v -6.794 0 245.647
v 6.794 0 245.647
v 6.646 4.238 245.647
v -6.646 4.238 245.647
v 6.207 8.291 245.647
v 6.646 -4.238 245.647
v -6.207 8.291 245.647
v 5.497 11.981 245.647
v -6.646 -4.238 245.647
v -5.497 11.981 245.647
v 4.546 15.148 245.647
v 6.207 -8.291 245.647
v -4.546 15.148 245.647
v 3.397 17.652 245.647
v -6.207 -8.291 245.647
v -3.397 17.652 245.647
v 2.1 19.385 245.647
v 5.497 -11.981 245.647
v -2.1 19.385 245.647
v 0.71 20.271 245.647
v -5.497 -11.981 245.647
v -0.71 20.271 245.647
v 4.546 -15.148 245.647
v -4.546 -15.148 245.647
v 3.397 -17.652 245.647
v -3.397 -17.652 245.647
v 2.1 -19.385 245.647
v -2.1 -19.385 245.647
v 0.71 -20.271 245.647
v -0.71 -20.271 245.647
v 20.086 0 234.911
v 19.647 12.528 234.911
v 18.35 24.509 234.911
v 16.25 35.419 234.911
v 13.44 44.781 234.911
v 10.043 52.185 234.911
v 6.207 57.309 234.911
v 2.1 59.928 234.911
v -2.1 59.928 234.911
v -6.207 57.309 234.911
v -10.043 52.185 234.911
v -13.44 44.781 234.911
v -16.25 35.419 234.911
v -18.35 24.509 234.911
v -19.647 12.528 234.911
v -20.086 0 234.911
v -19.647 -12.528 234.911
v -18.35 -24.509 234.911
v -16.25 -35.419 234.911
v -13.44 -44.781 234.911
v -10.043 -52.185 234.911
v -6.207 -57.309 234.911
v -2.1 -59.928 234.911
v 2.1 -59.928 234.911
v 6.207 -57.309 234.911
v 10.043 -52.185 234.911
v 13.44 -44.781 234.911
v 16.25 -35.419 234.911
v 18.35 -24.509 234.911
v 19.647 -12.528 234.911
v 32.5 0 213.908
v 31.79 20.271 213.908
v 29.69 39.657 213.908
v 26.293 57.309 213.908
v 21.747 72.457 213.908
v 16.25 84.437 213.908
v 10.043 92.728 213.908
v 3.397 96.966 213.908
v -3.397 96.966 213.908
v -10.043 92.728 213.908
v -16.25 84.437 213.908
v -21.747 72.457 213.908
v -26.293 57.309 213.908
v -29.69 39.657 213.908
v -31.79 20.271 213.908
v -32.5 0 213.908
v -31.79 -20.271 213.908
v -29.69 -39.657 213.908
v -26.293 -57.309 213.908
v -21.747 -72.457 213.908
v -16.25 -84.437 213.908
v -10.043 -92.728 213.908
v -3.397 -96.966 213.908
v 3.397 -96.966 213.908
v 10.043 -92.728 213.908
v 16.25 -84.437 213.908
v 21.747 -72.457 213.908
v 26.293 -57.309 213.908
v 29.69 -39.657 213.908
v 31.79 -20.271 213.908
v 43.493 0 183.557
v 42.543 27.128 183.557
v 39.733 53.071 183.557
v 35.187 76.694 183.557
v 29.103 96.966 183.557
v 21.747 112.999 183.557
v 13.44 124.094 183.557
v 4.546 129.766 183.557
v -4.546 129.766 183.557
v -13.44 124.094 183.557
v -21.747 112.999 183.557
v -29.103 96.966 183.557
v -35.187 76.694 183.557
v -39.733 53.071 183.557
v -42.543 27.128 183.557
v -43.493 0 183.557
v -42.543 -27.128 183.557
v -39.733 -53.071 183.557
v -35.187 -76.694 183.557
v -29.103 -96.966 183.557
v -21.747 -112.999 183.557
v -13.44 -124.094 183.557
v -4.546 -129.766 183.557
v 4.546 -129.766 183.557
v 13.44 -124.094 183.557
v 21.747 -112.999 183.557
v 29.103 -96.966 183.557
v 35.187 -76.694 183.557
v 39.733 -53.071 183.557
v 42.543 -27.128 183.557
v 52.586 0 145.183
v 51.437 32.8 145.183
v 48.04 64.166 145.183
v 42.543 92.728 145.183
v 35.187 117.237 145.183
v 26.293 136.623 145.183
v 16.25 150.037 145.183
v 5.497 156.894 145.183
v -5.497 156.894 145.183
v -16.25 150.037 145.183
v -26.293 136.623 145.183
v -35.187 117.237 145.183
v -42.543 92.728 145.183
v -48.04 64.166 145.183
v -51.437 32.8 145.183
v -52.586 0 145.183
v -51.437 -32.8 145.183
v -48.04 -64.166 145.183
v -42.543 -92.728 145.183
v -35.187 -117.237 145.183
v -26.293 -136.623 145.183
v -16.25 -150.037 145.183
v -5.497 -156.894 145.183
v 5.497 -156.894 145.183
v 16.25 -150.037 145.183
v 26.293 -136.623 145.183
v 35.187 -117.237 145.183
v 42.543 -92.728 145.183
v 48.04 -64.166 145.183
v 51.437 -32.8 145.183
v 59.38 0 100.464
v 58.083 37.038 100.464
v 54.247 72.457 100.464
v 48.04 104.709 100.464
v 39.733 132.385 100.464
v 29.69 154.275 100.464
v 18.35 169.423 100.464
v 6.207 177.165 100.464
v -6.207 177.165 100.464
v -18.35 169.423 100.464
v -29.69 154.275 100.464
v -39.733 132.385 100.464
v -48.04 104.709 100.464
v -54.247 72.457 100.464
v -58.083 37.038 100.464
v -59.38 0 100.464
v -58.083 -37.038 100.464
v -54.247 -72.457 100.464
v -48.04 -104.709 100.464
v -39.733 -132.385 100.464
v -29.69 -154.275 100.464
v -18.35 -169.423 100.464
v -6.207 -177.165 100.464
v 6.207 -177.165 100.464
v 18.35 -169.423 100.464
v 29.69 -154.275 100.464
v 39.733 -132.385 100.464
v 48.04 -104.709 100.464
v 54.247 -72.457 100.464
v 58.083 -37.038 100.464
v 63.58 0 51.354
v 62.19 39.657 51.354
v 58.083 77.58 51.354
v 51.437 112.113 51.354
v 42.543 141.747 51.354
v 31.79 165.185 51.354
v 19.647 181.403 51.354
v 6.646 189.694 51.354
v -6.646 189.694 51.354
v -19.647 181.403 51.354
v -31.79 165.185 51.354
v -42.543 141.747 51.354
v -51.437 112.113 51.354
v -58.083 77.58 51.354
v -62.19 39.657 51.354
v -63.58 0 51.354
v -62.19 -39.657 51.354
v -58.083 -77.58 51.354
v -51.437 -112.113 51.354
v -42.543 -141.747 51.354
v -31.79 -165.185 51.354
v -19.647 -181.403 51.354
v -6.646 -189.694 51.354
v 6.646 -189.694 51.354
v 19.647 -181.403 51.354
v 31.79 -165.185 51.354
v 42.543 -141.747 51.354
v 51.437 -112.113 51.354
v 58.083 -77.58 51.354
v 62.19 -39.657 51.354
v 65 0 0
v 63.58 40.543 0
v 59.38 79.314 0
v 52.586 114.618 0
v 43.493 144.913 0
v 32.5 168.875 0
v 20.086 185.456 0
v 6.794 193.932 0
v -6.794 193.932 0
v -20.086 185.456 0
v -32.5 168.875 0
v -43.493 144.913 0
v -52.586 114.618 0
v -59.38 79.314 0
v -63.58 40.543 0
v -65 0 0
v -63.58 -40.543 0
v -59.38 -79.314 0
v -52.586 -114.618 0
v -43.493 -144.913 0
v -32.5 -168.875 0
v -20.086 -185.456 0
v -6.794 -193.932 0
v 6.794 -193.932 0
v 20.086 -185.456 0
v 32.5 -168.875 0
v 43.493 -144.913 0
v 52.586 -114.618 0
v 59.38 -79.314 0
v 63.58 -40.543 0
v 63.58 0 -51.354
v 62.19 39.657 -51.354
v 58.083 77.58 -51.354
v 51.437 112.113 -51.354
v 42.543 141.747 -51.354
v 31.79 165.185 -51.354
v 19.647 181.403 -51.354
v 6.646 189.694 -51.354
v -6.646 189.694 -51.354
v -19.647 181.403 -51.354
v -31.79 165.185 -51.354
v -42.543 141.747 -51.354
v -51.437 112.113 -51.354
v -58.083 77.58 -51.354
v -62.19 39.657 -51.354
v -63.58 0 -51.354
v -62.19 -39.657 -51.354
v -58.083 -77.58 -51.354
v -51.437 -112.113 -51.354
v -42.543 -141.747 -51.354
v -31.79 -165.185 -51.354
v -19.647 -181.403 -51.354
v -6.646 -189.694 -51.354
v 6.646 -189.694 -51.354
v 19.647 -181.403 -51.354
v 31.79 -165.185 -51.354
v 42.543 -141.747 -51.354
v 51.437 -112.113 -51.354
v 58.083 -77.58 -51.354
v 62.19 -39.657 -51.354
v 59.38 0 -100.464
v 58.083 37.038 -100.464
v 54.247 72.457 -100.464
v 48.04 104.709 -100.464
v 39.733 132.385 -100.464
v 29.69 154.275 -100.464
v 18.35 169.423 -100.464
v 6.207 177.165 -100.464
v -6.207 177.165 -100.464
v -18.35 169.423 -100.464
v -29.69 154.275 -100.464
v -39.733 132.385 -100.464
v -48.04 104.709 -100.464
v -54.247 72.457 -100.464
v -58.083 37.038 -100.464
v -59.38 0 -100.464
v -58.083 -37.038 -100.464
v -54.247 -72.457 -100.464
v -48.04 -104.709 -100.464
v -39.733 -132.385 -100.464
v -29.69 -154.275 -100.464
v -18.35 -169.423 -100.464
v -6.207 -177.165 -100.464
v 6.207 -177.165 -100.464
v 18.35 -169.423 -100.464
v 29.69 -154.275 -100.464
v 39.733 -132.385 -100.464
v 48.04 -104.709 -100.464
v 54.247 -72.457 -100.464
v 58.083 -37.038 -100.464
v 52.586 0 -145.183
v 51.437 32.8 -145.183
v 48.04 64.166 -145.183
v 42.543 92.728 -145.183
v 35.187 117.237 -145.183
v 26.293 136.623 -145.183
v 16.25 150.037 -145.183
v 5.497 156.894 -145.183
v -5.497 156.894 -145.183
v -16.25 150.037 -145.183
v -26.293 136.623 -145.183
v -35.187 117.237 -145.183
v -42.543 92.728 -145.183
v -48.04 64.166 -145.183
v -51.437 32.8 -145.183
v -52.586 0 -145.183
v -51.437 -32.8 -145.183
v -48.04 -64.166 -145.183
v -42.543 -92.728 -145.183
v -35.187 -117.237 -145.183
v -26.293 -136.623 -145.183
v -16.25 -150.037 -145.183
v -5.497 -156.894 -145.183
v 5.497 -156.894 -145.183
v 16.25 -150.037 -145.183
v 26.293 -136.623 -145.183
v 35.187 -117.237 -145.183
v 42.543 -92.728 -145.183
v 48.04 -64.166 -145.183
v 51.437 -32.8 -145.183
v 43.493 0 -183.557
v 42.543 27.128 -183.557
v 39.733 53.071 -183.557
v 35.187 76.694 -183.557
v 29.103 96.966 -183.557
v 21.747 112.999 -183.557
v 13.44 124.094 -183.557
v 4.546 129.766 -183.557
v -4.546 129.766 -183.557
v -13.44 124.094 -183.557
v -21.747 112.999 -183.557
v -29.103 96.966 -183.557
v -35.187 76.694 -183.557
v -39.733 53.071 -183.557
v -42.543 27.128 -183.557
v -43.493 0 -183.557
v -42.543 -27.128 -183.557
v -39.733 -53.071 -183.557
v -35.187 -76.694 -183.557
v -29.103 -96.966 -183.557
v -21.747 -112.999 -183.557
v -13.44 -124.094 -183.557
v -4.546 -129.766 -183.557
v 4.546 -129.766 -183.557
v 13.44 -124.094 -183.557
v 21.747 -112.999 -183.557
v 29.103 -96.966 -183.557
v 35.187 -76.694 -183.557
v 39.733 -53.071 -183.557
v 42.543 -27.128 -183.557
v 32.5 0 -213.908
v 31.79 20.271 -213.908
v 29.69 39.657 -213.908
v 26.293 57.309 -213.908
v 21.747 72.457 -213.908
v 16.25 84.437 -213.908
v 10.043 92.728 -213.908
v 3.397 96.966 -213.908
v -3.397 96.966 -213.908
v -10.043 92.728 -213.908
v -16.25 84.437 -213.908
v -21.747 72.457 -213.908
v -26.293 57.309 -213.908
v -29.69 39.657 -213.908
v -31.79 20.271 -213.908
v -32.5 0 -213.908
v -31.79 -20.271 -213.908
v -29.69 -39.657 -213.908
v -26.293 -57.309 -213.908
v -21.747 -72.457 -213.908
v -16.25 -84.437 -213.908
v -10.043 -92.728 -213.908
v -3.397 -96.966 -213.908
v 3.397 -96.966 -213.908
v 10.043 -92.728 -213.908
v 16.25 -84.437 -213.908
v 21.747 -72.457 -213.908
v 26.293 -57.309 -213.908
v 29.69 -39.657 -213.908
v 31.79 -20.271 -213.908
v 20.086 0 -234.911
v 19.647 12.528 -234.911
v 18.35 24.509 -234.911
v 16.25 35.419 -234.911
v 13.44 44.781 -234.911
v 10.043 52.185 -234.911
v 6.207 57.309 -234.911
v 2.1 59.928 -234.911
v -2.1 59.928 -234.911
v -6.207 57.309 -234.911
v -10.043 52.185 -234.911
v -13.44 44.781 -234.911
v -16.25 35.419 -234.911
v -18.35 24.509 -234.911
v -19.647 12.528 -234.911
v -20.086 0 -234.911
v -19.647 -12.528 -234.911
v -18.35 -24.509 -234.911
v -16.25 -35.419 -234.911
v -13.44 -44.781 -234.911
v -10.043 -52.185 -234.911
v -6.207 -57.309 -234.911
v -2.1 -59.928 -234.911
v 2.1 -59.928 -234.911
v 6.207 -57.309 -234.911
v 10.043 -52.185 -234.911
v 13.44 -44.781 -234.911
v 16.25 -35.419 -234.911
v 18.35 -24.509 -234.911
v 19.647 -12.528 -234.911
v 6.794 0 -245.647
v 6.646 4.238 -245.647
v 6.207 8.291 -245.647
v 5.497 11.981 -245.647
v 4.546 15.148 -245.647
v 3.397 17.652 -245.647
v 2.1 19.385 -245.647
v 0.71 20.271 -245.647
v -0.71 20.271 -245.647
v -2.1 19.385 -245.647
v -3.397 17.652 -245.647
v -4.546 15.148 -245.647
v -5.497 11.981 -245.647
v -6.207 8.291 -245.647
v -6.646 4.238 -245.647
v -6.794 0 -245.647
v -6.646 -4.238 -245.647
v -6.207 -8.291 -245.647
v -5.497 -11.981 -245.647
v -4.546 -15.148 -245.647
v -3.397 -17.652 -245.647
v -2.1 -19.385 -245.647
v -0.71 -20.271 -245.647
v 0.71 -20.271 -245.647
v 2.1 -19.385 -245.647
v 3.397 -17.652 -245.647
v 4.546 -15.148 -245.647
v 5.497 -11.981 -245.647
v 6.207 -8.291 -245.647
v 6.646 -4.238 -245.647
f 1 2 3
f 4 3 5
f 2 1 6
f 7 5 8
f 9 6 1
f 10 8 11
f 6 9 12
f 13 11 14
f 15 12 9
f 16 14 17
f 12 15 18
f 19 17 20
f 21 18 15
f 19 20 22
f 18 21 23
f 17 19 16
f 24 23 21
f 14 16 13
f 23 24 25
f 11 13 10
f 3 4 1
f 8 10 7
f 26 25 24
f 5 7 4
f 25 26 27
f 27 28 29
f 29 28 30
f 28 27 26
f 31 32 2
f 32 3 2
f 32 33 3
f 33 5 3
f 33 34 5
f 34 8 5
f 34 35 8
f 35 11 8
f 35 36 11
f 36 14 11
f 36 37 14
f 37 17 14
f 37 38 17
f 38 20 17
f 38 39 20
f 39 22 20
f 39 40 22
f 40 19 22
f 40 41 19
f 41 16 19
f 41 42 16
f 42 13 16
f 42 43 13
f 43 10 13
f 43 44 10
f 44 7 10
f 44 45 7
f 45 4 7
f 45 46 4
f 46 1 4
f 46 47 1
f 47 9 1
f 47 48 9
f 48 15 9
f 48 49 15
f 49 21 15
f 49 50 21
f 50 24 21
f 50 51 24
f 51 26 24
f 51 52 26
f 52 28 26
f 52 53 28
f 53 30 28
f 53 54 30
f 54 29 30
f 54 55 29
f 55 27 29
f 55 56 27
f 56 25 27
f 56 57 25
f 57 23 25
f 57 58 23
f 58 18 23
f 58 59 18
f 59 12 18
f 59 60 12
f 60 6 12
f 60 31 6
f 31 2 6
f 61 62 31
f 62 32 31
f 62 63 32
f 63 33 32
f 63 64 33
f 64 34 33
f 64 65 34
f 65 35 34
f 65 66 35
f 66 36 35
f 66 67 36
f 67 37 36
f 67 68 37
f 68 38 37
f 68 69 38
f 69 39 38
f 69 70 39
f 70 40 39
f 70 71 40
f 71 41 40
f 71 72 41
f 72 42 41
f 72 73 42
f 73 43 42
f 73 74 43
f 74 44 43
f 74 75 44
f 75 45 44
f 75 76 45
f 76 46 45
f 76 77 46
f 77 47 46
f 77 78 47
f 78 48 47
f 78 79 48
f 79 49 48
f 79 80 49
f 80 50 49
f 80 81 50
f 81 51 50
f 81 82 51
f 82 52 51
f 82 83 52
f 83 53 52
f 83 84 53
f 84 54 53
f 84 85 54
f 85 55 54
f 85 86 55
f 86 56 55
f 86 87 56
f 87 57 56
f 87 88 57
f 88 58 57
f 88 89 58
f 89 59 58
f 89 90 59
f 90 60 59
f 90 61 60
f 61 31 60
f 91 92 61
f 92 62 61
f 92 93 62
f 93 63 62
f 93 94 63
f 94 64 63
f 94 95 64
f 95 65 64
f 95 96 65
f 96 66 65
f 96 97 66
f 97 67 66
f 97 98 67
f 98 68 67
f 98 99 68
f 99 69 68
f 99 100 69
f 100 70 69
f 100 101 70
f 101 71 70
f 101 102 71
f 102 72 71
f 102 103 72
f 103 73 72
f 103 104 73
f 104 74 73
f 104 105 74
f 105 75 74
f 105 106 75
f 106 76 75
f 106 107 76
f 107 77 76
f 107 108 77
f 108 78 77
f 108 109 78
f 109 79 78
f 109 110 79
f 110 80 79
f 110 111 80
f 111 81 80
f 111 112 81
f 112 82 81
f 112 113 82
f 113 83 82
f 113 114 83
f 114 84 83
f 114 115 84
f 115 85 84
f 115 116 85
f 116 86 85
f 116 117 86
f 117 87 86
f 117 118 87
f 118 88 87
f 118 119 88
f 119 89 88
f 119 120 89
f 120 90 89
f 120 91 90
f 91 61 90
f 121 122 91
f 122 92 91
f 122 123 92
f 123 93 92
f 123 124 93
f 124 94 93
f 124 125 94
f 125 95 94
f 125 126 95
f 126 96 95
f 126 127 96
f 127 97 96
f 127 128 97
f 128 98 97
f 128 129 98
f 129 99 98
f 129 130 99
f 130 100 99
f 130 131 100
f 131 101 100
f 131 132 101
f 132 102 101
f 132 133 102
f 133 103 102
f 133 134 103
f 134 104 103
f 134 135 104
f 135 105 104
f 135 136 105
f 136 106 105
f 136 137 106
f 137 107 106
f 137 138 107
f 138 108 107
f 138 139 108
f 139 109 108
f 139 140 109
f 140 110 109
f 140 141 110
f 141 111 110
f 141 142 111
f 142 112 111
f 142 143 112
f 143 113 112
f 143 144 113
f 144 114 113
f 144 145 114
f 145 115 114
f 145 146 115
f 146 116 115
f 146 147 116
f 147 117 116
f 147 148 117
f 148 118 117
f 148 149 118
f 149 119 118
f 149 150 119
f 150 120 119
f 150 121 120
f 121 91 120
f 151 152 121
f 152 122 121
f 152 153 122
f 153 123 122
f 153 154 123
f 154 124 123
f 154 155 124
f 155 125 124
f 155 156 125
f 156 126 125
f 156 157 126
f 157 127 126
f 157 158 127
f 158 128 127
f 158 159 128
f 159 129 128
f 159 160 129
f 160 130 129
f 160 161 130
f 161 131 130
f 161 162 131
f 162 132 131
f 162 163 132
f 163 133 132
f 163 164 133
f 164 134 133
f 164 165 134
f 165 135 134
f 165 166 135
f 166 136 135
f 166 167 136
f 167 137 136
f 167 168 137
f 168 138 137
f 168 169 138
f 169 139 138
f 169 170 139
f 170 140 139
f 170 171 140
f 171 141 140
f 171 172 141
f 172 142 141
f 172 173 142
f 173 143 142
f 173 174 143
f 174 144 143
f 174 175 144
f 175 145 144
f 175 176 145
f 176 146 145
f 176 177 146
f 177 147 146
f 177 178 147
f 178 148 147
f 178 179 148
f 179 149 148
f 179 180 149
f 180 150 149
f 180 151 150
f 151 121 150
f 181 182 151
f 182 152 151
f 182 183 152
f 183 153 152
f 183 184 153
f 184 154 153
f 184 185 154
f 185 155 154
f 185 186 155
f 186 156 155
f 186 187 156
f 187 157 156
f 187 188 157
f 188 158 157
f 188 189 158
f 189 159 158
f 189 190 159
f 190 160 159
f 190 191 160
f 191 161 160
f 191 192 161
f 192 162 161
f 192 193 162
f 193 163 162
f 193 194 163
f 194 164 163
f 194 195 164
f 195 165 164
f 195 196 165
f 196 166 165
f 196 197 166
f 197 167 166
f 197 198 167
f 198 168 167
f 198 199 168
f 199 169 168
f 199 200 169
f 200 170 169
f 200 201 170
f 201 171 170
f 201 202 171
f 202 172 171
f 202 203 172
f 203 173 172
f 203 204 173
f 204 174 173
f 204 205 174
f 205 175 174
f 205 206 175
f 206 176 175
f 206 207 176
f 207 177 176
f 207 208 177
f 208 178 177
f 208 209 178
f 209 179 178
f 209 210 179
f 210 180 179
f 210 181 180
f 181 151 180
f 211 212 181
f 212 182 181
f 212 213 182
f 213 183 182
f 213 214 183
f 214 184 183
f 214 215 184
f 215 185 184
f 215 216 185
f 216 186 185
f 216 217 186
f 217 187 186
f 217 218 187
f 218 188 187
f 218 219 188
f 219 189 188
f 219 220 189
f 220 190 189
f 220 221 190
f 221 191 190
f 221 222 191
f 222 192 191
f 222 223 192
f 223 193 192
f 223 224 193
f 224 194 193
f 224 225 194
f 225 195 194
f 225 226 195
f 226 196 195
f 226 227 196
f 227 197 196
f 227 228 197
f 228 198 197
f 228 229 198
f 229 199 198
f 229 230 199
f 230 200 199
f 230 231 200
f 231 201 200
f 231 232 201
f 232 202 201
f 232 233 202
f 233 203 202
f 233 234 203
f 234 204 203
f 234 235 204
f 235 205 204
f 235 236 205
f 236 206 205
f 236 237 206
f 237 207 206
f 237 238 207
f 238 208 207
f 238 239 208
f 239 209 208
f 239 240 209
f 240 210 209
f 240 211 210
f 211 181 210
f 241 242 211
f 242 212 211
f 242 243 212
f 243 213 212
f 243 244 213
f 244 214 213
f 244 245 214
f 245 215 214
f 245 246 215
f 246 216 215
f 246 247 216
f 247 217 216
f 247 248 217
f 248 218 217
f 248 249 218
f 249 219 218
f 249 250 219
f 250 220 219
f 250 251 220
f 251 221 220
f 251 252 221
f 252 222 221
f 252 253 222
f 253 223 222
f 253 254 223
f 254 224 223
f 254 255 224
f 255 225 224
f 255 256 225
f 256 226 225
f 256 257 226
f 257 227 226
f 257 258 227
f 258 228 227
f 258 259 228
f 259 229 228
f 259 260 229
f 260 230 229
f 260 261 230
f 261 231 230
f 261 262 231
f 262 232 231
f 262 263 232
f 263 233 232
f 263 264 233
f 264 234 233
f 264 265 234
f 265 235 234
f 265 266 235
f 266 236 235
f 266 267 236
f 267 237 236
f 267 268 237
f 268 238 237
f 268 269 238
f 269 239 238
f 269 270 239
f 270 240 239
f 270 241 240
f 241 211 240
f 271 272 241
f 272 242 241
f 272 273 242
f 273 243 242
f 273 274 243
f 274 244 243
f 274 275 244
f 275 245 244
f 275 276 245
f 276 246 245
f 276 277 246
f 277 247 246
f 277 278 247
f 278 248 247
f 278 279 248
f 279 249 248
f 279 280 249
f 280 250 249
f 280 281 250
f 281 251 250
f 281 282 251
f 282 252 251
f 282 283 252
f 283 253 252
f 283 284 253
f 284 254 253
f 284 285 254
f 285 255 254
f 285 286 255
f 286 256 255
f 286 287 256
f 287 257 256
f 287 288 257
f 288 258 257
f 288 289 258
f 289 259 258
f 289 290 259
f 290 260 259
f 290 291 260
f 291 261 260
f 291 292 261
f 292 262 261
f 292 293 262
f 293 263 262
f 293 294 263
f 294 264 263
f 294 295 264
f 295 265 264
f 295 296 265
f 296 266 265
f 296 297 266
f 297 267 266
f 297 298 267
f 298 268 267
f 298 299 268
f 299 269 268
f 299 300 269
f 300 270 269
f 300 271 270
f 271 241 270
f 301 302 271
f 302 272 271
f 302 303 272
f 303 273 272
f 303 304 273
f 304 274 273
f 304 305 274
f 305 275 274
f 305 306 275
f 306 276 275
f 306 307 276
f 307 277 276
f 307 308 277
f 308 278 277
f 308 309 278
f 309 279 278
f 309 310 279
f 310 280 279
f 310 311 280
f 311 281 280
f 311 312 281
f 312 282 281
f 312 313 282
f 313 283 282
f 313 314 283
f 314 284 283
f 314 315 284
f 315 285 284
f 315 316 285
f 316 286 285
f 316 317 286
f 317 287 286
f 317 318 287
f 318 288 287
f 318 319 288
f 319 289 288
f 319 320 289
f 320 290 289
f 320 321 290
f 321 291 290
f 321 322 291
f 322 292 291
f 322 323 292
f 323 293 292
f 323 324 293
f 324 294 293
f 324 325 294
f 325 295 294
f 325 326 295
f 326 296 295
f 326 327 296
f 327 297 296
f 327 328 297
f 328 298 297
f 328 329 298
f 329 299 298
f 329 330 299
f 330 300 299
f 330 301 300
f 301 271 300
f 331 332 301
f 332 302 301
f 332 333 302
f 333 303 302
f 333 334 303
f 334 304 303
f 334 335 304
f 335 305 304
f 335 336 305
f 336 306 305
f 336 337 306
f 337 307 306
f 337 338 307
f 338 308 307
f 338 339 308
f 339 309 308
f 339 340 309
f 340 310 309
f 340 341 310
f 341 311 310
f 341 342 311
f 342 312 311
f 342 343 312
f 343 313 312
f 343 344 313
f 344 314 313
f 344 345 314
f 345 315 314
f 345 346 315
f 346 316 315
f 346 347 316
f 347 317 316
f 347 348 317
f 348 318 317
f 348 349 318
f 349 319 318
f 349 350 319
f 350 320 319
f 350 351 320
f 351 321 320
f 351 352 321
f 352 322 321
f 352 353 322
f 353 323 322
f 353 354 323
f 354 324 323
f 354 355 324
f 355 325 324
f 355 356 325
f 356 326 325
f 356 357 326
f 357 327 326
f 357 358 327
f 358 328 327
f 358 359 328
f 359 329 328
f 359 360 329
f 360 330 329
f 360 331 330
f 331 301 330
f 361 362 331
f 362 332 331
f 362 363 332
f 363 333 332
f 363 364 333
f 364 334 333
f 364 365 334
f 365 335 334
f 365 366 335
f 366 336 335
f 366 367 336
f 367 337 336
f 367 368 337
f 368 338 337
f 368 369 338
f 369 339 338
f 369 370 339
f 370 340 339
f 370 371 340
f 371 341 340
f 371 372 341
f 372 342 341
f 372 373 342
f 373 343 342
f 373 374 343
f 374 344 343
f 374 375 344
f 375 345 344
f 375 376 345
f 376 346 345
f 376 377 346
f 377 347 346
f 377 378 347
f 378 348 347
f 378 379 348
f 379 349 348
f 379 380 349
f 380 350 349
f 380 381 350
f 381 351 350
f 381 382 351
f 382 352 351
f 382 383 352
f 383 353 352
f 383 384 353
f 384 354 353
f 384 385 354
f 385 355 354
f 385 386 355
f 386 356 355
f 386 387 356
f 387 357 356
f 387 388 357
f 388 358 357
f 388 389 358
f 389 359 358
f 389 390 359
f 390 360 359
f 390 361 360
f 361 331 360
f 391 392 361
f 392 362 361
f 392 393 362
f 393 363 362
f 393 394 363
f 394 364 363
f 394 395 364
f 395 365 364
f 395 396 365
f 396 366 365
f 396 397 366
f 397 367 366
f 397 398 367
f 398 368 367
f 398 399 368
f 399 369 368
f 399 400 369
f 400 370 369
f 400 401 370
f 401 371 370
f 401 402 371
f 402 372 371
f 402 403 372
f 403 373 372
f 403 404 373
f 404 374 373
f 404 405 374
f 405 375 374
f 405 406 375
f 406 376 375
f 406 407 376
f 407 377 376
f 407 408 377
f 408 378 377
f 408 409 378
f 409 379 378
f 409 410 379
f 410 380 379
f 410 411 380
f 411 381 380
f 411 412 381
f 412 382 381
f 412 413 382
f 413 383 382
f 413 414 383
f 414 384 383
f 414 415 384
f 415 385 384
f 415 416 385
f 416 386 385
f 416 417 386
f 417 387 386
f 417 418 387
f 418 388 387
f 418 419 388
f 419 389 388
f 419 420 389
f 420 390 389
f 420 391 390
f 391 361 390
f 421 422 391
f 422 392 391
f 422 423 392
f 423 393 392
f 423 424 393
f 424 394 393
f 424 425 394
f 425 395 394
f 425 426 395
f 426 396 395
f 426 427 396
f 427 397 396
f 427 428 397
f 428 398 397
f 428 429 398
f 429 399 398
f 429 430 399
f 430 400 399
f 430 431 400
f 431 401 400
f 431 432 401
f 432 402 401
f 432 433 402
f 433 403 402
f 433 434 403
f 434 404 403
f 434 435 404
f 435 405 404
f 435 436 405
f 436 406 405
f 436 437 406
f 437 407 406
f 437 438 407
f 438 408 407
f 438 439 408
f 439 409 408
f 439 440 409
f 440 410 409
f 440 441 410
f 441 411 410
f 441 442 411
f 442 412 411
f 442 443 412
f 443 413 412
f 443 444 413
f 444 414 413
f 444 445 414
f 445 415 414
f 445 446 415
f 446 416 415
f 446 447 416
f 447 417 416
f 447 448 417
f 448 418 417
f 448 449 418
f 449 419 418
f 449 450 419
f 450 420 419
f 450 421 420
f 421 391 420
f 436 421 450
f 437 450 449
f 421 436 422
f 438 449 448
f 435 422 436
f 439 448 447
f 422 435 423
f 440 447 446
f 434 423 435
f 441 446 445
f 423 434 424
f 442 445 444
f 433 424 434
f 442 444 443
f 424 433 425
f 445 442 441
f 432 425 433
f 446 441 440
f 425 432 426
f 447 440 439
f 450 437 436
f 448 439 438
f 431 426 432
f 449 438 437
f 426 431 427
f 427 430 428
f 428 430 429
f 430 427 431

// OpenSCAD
// Generated by SolidPython 1.0.1 on 2020-07-29 00:46:46


scale(v = [5, 15, 19]) {
	sphere(r = 13);
}
/***********************************************
*********      SolidPython code:      **********
************************************************
 
# import packages: SolidPython
from solid import *
from solid.utils import *
from itertools import chain, combinations, permutations


class Resize:

    def __init__(self, scad_file):
        self.scad_file = scad_file
        #self.scad_file = import_scad(scad_file)
        # cone/cylinder param:
        self.r1 = 0
        self.r2 = 0
        self.h = 0
        # rectangular prism param:
        self.w = 0
        self.l = 0
        # ellipse param:
        self.r = 0

    # import OpenScad code (file name corresponds to shape)


    # classify shape + parameters
    def assign(self, param1, param2, param3):
        if self.scad_file == 'cone.scad':
            self.r1 = param1
            self.r2 = param2
            self.h = param3
        elif self.scad_file == 'cylinder.scad':
            self.r1 = param1
            self.r2 = param2
            self.h = param3
        elif self.scad_file == 'rectangularPrism.scad':
            self.h = param1
            self.l = param2
            self.w = param3
        else:
            self.r = param1
            self.h = param2

    # resize parameters
    def iterate(self):
        x = range(3, 20, 2)
        i = 1
        if self.scad_file == 'cone.scad':
            tempList = list(permutations(x, 2))
            for temp in tempList:
                param1 = temp[0]
                param2 = temp[1]
                filepath = 'produced_scad_files/' + 'cone' + str(param1) + '_' + str(param2) + '_' + '.scad'
                scad_render_to_file(cylinder(h=param1, r1=param2, r2=0), filepath)

        elif self.scad_file == 'cylinder.scad':
            tempList = list(permutations(x, 3))
            for temp in tempList:
                param1 = temp[0]
                param2 = temp[1]
                filepath = 'produced_scad_files/' + 'cylinder' + str(param1) + '_' + str(param2) + '_' + '.scad'
                scad_render_to_file(cylinder(h=param1, r1=param2, r2=param2), filepath)

        elif self.scad_file == 'rectangularPrism.scad':
            tempList = list(permutations(x, 3))
            for temp in tempList:
                param1 = temp[0]
                param2 = temp[1]
                param3 = temp[2]
                filepath = 'produced_scad_files/' + 'rectangularPrism' + str(param1) + '_' + str(param2) + '_' + str(
                    param3) + '.scad'
                scad_render_to_file(cube(size=(param1, param2, param3)), filepath)

        elif self.scad_file == 'ellipse.scad':
            tempList = list(permutations(x, 4))
            for temp in tempList:
                param1 = temp[0]
                param2 = temp[1]
                param3 = temp[2]
                param4 = temp[3]
                filepath = 'produced_scad_files/' + 'ellipse' + str(param1) + '_' + str(param2) + '_' + str(param3) + '_' + str(param4) + '.scad'
                scad_render_to_file(scale([param1, param2, param3])(sphere(r=param4)), filepath)

    def render_to_scadfile(self):
        scad_render_to_file(scad, 'example.scad') 
 
************************************************/
